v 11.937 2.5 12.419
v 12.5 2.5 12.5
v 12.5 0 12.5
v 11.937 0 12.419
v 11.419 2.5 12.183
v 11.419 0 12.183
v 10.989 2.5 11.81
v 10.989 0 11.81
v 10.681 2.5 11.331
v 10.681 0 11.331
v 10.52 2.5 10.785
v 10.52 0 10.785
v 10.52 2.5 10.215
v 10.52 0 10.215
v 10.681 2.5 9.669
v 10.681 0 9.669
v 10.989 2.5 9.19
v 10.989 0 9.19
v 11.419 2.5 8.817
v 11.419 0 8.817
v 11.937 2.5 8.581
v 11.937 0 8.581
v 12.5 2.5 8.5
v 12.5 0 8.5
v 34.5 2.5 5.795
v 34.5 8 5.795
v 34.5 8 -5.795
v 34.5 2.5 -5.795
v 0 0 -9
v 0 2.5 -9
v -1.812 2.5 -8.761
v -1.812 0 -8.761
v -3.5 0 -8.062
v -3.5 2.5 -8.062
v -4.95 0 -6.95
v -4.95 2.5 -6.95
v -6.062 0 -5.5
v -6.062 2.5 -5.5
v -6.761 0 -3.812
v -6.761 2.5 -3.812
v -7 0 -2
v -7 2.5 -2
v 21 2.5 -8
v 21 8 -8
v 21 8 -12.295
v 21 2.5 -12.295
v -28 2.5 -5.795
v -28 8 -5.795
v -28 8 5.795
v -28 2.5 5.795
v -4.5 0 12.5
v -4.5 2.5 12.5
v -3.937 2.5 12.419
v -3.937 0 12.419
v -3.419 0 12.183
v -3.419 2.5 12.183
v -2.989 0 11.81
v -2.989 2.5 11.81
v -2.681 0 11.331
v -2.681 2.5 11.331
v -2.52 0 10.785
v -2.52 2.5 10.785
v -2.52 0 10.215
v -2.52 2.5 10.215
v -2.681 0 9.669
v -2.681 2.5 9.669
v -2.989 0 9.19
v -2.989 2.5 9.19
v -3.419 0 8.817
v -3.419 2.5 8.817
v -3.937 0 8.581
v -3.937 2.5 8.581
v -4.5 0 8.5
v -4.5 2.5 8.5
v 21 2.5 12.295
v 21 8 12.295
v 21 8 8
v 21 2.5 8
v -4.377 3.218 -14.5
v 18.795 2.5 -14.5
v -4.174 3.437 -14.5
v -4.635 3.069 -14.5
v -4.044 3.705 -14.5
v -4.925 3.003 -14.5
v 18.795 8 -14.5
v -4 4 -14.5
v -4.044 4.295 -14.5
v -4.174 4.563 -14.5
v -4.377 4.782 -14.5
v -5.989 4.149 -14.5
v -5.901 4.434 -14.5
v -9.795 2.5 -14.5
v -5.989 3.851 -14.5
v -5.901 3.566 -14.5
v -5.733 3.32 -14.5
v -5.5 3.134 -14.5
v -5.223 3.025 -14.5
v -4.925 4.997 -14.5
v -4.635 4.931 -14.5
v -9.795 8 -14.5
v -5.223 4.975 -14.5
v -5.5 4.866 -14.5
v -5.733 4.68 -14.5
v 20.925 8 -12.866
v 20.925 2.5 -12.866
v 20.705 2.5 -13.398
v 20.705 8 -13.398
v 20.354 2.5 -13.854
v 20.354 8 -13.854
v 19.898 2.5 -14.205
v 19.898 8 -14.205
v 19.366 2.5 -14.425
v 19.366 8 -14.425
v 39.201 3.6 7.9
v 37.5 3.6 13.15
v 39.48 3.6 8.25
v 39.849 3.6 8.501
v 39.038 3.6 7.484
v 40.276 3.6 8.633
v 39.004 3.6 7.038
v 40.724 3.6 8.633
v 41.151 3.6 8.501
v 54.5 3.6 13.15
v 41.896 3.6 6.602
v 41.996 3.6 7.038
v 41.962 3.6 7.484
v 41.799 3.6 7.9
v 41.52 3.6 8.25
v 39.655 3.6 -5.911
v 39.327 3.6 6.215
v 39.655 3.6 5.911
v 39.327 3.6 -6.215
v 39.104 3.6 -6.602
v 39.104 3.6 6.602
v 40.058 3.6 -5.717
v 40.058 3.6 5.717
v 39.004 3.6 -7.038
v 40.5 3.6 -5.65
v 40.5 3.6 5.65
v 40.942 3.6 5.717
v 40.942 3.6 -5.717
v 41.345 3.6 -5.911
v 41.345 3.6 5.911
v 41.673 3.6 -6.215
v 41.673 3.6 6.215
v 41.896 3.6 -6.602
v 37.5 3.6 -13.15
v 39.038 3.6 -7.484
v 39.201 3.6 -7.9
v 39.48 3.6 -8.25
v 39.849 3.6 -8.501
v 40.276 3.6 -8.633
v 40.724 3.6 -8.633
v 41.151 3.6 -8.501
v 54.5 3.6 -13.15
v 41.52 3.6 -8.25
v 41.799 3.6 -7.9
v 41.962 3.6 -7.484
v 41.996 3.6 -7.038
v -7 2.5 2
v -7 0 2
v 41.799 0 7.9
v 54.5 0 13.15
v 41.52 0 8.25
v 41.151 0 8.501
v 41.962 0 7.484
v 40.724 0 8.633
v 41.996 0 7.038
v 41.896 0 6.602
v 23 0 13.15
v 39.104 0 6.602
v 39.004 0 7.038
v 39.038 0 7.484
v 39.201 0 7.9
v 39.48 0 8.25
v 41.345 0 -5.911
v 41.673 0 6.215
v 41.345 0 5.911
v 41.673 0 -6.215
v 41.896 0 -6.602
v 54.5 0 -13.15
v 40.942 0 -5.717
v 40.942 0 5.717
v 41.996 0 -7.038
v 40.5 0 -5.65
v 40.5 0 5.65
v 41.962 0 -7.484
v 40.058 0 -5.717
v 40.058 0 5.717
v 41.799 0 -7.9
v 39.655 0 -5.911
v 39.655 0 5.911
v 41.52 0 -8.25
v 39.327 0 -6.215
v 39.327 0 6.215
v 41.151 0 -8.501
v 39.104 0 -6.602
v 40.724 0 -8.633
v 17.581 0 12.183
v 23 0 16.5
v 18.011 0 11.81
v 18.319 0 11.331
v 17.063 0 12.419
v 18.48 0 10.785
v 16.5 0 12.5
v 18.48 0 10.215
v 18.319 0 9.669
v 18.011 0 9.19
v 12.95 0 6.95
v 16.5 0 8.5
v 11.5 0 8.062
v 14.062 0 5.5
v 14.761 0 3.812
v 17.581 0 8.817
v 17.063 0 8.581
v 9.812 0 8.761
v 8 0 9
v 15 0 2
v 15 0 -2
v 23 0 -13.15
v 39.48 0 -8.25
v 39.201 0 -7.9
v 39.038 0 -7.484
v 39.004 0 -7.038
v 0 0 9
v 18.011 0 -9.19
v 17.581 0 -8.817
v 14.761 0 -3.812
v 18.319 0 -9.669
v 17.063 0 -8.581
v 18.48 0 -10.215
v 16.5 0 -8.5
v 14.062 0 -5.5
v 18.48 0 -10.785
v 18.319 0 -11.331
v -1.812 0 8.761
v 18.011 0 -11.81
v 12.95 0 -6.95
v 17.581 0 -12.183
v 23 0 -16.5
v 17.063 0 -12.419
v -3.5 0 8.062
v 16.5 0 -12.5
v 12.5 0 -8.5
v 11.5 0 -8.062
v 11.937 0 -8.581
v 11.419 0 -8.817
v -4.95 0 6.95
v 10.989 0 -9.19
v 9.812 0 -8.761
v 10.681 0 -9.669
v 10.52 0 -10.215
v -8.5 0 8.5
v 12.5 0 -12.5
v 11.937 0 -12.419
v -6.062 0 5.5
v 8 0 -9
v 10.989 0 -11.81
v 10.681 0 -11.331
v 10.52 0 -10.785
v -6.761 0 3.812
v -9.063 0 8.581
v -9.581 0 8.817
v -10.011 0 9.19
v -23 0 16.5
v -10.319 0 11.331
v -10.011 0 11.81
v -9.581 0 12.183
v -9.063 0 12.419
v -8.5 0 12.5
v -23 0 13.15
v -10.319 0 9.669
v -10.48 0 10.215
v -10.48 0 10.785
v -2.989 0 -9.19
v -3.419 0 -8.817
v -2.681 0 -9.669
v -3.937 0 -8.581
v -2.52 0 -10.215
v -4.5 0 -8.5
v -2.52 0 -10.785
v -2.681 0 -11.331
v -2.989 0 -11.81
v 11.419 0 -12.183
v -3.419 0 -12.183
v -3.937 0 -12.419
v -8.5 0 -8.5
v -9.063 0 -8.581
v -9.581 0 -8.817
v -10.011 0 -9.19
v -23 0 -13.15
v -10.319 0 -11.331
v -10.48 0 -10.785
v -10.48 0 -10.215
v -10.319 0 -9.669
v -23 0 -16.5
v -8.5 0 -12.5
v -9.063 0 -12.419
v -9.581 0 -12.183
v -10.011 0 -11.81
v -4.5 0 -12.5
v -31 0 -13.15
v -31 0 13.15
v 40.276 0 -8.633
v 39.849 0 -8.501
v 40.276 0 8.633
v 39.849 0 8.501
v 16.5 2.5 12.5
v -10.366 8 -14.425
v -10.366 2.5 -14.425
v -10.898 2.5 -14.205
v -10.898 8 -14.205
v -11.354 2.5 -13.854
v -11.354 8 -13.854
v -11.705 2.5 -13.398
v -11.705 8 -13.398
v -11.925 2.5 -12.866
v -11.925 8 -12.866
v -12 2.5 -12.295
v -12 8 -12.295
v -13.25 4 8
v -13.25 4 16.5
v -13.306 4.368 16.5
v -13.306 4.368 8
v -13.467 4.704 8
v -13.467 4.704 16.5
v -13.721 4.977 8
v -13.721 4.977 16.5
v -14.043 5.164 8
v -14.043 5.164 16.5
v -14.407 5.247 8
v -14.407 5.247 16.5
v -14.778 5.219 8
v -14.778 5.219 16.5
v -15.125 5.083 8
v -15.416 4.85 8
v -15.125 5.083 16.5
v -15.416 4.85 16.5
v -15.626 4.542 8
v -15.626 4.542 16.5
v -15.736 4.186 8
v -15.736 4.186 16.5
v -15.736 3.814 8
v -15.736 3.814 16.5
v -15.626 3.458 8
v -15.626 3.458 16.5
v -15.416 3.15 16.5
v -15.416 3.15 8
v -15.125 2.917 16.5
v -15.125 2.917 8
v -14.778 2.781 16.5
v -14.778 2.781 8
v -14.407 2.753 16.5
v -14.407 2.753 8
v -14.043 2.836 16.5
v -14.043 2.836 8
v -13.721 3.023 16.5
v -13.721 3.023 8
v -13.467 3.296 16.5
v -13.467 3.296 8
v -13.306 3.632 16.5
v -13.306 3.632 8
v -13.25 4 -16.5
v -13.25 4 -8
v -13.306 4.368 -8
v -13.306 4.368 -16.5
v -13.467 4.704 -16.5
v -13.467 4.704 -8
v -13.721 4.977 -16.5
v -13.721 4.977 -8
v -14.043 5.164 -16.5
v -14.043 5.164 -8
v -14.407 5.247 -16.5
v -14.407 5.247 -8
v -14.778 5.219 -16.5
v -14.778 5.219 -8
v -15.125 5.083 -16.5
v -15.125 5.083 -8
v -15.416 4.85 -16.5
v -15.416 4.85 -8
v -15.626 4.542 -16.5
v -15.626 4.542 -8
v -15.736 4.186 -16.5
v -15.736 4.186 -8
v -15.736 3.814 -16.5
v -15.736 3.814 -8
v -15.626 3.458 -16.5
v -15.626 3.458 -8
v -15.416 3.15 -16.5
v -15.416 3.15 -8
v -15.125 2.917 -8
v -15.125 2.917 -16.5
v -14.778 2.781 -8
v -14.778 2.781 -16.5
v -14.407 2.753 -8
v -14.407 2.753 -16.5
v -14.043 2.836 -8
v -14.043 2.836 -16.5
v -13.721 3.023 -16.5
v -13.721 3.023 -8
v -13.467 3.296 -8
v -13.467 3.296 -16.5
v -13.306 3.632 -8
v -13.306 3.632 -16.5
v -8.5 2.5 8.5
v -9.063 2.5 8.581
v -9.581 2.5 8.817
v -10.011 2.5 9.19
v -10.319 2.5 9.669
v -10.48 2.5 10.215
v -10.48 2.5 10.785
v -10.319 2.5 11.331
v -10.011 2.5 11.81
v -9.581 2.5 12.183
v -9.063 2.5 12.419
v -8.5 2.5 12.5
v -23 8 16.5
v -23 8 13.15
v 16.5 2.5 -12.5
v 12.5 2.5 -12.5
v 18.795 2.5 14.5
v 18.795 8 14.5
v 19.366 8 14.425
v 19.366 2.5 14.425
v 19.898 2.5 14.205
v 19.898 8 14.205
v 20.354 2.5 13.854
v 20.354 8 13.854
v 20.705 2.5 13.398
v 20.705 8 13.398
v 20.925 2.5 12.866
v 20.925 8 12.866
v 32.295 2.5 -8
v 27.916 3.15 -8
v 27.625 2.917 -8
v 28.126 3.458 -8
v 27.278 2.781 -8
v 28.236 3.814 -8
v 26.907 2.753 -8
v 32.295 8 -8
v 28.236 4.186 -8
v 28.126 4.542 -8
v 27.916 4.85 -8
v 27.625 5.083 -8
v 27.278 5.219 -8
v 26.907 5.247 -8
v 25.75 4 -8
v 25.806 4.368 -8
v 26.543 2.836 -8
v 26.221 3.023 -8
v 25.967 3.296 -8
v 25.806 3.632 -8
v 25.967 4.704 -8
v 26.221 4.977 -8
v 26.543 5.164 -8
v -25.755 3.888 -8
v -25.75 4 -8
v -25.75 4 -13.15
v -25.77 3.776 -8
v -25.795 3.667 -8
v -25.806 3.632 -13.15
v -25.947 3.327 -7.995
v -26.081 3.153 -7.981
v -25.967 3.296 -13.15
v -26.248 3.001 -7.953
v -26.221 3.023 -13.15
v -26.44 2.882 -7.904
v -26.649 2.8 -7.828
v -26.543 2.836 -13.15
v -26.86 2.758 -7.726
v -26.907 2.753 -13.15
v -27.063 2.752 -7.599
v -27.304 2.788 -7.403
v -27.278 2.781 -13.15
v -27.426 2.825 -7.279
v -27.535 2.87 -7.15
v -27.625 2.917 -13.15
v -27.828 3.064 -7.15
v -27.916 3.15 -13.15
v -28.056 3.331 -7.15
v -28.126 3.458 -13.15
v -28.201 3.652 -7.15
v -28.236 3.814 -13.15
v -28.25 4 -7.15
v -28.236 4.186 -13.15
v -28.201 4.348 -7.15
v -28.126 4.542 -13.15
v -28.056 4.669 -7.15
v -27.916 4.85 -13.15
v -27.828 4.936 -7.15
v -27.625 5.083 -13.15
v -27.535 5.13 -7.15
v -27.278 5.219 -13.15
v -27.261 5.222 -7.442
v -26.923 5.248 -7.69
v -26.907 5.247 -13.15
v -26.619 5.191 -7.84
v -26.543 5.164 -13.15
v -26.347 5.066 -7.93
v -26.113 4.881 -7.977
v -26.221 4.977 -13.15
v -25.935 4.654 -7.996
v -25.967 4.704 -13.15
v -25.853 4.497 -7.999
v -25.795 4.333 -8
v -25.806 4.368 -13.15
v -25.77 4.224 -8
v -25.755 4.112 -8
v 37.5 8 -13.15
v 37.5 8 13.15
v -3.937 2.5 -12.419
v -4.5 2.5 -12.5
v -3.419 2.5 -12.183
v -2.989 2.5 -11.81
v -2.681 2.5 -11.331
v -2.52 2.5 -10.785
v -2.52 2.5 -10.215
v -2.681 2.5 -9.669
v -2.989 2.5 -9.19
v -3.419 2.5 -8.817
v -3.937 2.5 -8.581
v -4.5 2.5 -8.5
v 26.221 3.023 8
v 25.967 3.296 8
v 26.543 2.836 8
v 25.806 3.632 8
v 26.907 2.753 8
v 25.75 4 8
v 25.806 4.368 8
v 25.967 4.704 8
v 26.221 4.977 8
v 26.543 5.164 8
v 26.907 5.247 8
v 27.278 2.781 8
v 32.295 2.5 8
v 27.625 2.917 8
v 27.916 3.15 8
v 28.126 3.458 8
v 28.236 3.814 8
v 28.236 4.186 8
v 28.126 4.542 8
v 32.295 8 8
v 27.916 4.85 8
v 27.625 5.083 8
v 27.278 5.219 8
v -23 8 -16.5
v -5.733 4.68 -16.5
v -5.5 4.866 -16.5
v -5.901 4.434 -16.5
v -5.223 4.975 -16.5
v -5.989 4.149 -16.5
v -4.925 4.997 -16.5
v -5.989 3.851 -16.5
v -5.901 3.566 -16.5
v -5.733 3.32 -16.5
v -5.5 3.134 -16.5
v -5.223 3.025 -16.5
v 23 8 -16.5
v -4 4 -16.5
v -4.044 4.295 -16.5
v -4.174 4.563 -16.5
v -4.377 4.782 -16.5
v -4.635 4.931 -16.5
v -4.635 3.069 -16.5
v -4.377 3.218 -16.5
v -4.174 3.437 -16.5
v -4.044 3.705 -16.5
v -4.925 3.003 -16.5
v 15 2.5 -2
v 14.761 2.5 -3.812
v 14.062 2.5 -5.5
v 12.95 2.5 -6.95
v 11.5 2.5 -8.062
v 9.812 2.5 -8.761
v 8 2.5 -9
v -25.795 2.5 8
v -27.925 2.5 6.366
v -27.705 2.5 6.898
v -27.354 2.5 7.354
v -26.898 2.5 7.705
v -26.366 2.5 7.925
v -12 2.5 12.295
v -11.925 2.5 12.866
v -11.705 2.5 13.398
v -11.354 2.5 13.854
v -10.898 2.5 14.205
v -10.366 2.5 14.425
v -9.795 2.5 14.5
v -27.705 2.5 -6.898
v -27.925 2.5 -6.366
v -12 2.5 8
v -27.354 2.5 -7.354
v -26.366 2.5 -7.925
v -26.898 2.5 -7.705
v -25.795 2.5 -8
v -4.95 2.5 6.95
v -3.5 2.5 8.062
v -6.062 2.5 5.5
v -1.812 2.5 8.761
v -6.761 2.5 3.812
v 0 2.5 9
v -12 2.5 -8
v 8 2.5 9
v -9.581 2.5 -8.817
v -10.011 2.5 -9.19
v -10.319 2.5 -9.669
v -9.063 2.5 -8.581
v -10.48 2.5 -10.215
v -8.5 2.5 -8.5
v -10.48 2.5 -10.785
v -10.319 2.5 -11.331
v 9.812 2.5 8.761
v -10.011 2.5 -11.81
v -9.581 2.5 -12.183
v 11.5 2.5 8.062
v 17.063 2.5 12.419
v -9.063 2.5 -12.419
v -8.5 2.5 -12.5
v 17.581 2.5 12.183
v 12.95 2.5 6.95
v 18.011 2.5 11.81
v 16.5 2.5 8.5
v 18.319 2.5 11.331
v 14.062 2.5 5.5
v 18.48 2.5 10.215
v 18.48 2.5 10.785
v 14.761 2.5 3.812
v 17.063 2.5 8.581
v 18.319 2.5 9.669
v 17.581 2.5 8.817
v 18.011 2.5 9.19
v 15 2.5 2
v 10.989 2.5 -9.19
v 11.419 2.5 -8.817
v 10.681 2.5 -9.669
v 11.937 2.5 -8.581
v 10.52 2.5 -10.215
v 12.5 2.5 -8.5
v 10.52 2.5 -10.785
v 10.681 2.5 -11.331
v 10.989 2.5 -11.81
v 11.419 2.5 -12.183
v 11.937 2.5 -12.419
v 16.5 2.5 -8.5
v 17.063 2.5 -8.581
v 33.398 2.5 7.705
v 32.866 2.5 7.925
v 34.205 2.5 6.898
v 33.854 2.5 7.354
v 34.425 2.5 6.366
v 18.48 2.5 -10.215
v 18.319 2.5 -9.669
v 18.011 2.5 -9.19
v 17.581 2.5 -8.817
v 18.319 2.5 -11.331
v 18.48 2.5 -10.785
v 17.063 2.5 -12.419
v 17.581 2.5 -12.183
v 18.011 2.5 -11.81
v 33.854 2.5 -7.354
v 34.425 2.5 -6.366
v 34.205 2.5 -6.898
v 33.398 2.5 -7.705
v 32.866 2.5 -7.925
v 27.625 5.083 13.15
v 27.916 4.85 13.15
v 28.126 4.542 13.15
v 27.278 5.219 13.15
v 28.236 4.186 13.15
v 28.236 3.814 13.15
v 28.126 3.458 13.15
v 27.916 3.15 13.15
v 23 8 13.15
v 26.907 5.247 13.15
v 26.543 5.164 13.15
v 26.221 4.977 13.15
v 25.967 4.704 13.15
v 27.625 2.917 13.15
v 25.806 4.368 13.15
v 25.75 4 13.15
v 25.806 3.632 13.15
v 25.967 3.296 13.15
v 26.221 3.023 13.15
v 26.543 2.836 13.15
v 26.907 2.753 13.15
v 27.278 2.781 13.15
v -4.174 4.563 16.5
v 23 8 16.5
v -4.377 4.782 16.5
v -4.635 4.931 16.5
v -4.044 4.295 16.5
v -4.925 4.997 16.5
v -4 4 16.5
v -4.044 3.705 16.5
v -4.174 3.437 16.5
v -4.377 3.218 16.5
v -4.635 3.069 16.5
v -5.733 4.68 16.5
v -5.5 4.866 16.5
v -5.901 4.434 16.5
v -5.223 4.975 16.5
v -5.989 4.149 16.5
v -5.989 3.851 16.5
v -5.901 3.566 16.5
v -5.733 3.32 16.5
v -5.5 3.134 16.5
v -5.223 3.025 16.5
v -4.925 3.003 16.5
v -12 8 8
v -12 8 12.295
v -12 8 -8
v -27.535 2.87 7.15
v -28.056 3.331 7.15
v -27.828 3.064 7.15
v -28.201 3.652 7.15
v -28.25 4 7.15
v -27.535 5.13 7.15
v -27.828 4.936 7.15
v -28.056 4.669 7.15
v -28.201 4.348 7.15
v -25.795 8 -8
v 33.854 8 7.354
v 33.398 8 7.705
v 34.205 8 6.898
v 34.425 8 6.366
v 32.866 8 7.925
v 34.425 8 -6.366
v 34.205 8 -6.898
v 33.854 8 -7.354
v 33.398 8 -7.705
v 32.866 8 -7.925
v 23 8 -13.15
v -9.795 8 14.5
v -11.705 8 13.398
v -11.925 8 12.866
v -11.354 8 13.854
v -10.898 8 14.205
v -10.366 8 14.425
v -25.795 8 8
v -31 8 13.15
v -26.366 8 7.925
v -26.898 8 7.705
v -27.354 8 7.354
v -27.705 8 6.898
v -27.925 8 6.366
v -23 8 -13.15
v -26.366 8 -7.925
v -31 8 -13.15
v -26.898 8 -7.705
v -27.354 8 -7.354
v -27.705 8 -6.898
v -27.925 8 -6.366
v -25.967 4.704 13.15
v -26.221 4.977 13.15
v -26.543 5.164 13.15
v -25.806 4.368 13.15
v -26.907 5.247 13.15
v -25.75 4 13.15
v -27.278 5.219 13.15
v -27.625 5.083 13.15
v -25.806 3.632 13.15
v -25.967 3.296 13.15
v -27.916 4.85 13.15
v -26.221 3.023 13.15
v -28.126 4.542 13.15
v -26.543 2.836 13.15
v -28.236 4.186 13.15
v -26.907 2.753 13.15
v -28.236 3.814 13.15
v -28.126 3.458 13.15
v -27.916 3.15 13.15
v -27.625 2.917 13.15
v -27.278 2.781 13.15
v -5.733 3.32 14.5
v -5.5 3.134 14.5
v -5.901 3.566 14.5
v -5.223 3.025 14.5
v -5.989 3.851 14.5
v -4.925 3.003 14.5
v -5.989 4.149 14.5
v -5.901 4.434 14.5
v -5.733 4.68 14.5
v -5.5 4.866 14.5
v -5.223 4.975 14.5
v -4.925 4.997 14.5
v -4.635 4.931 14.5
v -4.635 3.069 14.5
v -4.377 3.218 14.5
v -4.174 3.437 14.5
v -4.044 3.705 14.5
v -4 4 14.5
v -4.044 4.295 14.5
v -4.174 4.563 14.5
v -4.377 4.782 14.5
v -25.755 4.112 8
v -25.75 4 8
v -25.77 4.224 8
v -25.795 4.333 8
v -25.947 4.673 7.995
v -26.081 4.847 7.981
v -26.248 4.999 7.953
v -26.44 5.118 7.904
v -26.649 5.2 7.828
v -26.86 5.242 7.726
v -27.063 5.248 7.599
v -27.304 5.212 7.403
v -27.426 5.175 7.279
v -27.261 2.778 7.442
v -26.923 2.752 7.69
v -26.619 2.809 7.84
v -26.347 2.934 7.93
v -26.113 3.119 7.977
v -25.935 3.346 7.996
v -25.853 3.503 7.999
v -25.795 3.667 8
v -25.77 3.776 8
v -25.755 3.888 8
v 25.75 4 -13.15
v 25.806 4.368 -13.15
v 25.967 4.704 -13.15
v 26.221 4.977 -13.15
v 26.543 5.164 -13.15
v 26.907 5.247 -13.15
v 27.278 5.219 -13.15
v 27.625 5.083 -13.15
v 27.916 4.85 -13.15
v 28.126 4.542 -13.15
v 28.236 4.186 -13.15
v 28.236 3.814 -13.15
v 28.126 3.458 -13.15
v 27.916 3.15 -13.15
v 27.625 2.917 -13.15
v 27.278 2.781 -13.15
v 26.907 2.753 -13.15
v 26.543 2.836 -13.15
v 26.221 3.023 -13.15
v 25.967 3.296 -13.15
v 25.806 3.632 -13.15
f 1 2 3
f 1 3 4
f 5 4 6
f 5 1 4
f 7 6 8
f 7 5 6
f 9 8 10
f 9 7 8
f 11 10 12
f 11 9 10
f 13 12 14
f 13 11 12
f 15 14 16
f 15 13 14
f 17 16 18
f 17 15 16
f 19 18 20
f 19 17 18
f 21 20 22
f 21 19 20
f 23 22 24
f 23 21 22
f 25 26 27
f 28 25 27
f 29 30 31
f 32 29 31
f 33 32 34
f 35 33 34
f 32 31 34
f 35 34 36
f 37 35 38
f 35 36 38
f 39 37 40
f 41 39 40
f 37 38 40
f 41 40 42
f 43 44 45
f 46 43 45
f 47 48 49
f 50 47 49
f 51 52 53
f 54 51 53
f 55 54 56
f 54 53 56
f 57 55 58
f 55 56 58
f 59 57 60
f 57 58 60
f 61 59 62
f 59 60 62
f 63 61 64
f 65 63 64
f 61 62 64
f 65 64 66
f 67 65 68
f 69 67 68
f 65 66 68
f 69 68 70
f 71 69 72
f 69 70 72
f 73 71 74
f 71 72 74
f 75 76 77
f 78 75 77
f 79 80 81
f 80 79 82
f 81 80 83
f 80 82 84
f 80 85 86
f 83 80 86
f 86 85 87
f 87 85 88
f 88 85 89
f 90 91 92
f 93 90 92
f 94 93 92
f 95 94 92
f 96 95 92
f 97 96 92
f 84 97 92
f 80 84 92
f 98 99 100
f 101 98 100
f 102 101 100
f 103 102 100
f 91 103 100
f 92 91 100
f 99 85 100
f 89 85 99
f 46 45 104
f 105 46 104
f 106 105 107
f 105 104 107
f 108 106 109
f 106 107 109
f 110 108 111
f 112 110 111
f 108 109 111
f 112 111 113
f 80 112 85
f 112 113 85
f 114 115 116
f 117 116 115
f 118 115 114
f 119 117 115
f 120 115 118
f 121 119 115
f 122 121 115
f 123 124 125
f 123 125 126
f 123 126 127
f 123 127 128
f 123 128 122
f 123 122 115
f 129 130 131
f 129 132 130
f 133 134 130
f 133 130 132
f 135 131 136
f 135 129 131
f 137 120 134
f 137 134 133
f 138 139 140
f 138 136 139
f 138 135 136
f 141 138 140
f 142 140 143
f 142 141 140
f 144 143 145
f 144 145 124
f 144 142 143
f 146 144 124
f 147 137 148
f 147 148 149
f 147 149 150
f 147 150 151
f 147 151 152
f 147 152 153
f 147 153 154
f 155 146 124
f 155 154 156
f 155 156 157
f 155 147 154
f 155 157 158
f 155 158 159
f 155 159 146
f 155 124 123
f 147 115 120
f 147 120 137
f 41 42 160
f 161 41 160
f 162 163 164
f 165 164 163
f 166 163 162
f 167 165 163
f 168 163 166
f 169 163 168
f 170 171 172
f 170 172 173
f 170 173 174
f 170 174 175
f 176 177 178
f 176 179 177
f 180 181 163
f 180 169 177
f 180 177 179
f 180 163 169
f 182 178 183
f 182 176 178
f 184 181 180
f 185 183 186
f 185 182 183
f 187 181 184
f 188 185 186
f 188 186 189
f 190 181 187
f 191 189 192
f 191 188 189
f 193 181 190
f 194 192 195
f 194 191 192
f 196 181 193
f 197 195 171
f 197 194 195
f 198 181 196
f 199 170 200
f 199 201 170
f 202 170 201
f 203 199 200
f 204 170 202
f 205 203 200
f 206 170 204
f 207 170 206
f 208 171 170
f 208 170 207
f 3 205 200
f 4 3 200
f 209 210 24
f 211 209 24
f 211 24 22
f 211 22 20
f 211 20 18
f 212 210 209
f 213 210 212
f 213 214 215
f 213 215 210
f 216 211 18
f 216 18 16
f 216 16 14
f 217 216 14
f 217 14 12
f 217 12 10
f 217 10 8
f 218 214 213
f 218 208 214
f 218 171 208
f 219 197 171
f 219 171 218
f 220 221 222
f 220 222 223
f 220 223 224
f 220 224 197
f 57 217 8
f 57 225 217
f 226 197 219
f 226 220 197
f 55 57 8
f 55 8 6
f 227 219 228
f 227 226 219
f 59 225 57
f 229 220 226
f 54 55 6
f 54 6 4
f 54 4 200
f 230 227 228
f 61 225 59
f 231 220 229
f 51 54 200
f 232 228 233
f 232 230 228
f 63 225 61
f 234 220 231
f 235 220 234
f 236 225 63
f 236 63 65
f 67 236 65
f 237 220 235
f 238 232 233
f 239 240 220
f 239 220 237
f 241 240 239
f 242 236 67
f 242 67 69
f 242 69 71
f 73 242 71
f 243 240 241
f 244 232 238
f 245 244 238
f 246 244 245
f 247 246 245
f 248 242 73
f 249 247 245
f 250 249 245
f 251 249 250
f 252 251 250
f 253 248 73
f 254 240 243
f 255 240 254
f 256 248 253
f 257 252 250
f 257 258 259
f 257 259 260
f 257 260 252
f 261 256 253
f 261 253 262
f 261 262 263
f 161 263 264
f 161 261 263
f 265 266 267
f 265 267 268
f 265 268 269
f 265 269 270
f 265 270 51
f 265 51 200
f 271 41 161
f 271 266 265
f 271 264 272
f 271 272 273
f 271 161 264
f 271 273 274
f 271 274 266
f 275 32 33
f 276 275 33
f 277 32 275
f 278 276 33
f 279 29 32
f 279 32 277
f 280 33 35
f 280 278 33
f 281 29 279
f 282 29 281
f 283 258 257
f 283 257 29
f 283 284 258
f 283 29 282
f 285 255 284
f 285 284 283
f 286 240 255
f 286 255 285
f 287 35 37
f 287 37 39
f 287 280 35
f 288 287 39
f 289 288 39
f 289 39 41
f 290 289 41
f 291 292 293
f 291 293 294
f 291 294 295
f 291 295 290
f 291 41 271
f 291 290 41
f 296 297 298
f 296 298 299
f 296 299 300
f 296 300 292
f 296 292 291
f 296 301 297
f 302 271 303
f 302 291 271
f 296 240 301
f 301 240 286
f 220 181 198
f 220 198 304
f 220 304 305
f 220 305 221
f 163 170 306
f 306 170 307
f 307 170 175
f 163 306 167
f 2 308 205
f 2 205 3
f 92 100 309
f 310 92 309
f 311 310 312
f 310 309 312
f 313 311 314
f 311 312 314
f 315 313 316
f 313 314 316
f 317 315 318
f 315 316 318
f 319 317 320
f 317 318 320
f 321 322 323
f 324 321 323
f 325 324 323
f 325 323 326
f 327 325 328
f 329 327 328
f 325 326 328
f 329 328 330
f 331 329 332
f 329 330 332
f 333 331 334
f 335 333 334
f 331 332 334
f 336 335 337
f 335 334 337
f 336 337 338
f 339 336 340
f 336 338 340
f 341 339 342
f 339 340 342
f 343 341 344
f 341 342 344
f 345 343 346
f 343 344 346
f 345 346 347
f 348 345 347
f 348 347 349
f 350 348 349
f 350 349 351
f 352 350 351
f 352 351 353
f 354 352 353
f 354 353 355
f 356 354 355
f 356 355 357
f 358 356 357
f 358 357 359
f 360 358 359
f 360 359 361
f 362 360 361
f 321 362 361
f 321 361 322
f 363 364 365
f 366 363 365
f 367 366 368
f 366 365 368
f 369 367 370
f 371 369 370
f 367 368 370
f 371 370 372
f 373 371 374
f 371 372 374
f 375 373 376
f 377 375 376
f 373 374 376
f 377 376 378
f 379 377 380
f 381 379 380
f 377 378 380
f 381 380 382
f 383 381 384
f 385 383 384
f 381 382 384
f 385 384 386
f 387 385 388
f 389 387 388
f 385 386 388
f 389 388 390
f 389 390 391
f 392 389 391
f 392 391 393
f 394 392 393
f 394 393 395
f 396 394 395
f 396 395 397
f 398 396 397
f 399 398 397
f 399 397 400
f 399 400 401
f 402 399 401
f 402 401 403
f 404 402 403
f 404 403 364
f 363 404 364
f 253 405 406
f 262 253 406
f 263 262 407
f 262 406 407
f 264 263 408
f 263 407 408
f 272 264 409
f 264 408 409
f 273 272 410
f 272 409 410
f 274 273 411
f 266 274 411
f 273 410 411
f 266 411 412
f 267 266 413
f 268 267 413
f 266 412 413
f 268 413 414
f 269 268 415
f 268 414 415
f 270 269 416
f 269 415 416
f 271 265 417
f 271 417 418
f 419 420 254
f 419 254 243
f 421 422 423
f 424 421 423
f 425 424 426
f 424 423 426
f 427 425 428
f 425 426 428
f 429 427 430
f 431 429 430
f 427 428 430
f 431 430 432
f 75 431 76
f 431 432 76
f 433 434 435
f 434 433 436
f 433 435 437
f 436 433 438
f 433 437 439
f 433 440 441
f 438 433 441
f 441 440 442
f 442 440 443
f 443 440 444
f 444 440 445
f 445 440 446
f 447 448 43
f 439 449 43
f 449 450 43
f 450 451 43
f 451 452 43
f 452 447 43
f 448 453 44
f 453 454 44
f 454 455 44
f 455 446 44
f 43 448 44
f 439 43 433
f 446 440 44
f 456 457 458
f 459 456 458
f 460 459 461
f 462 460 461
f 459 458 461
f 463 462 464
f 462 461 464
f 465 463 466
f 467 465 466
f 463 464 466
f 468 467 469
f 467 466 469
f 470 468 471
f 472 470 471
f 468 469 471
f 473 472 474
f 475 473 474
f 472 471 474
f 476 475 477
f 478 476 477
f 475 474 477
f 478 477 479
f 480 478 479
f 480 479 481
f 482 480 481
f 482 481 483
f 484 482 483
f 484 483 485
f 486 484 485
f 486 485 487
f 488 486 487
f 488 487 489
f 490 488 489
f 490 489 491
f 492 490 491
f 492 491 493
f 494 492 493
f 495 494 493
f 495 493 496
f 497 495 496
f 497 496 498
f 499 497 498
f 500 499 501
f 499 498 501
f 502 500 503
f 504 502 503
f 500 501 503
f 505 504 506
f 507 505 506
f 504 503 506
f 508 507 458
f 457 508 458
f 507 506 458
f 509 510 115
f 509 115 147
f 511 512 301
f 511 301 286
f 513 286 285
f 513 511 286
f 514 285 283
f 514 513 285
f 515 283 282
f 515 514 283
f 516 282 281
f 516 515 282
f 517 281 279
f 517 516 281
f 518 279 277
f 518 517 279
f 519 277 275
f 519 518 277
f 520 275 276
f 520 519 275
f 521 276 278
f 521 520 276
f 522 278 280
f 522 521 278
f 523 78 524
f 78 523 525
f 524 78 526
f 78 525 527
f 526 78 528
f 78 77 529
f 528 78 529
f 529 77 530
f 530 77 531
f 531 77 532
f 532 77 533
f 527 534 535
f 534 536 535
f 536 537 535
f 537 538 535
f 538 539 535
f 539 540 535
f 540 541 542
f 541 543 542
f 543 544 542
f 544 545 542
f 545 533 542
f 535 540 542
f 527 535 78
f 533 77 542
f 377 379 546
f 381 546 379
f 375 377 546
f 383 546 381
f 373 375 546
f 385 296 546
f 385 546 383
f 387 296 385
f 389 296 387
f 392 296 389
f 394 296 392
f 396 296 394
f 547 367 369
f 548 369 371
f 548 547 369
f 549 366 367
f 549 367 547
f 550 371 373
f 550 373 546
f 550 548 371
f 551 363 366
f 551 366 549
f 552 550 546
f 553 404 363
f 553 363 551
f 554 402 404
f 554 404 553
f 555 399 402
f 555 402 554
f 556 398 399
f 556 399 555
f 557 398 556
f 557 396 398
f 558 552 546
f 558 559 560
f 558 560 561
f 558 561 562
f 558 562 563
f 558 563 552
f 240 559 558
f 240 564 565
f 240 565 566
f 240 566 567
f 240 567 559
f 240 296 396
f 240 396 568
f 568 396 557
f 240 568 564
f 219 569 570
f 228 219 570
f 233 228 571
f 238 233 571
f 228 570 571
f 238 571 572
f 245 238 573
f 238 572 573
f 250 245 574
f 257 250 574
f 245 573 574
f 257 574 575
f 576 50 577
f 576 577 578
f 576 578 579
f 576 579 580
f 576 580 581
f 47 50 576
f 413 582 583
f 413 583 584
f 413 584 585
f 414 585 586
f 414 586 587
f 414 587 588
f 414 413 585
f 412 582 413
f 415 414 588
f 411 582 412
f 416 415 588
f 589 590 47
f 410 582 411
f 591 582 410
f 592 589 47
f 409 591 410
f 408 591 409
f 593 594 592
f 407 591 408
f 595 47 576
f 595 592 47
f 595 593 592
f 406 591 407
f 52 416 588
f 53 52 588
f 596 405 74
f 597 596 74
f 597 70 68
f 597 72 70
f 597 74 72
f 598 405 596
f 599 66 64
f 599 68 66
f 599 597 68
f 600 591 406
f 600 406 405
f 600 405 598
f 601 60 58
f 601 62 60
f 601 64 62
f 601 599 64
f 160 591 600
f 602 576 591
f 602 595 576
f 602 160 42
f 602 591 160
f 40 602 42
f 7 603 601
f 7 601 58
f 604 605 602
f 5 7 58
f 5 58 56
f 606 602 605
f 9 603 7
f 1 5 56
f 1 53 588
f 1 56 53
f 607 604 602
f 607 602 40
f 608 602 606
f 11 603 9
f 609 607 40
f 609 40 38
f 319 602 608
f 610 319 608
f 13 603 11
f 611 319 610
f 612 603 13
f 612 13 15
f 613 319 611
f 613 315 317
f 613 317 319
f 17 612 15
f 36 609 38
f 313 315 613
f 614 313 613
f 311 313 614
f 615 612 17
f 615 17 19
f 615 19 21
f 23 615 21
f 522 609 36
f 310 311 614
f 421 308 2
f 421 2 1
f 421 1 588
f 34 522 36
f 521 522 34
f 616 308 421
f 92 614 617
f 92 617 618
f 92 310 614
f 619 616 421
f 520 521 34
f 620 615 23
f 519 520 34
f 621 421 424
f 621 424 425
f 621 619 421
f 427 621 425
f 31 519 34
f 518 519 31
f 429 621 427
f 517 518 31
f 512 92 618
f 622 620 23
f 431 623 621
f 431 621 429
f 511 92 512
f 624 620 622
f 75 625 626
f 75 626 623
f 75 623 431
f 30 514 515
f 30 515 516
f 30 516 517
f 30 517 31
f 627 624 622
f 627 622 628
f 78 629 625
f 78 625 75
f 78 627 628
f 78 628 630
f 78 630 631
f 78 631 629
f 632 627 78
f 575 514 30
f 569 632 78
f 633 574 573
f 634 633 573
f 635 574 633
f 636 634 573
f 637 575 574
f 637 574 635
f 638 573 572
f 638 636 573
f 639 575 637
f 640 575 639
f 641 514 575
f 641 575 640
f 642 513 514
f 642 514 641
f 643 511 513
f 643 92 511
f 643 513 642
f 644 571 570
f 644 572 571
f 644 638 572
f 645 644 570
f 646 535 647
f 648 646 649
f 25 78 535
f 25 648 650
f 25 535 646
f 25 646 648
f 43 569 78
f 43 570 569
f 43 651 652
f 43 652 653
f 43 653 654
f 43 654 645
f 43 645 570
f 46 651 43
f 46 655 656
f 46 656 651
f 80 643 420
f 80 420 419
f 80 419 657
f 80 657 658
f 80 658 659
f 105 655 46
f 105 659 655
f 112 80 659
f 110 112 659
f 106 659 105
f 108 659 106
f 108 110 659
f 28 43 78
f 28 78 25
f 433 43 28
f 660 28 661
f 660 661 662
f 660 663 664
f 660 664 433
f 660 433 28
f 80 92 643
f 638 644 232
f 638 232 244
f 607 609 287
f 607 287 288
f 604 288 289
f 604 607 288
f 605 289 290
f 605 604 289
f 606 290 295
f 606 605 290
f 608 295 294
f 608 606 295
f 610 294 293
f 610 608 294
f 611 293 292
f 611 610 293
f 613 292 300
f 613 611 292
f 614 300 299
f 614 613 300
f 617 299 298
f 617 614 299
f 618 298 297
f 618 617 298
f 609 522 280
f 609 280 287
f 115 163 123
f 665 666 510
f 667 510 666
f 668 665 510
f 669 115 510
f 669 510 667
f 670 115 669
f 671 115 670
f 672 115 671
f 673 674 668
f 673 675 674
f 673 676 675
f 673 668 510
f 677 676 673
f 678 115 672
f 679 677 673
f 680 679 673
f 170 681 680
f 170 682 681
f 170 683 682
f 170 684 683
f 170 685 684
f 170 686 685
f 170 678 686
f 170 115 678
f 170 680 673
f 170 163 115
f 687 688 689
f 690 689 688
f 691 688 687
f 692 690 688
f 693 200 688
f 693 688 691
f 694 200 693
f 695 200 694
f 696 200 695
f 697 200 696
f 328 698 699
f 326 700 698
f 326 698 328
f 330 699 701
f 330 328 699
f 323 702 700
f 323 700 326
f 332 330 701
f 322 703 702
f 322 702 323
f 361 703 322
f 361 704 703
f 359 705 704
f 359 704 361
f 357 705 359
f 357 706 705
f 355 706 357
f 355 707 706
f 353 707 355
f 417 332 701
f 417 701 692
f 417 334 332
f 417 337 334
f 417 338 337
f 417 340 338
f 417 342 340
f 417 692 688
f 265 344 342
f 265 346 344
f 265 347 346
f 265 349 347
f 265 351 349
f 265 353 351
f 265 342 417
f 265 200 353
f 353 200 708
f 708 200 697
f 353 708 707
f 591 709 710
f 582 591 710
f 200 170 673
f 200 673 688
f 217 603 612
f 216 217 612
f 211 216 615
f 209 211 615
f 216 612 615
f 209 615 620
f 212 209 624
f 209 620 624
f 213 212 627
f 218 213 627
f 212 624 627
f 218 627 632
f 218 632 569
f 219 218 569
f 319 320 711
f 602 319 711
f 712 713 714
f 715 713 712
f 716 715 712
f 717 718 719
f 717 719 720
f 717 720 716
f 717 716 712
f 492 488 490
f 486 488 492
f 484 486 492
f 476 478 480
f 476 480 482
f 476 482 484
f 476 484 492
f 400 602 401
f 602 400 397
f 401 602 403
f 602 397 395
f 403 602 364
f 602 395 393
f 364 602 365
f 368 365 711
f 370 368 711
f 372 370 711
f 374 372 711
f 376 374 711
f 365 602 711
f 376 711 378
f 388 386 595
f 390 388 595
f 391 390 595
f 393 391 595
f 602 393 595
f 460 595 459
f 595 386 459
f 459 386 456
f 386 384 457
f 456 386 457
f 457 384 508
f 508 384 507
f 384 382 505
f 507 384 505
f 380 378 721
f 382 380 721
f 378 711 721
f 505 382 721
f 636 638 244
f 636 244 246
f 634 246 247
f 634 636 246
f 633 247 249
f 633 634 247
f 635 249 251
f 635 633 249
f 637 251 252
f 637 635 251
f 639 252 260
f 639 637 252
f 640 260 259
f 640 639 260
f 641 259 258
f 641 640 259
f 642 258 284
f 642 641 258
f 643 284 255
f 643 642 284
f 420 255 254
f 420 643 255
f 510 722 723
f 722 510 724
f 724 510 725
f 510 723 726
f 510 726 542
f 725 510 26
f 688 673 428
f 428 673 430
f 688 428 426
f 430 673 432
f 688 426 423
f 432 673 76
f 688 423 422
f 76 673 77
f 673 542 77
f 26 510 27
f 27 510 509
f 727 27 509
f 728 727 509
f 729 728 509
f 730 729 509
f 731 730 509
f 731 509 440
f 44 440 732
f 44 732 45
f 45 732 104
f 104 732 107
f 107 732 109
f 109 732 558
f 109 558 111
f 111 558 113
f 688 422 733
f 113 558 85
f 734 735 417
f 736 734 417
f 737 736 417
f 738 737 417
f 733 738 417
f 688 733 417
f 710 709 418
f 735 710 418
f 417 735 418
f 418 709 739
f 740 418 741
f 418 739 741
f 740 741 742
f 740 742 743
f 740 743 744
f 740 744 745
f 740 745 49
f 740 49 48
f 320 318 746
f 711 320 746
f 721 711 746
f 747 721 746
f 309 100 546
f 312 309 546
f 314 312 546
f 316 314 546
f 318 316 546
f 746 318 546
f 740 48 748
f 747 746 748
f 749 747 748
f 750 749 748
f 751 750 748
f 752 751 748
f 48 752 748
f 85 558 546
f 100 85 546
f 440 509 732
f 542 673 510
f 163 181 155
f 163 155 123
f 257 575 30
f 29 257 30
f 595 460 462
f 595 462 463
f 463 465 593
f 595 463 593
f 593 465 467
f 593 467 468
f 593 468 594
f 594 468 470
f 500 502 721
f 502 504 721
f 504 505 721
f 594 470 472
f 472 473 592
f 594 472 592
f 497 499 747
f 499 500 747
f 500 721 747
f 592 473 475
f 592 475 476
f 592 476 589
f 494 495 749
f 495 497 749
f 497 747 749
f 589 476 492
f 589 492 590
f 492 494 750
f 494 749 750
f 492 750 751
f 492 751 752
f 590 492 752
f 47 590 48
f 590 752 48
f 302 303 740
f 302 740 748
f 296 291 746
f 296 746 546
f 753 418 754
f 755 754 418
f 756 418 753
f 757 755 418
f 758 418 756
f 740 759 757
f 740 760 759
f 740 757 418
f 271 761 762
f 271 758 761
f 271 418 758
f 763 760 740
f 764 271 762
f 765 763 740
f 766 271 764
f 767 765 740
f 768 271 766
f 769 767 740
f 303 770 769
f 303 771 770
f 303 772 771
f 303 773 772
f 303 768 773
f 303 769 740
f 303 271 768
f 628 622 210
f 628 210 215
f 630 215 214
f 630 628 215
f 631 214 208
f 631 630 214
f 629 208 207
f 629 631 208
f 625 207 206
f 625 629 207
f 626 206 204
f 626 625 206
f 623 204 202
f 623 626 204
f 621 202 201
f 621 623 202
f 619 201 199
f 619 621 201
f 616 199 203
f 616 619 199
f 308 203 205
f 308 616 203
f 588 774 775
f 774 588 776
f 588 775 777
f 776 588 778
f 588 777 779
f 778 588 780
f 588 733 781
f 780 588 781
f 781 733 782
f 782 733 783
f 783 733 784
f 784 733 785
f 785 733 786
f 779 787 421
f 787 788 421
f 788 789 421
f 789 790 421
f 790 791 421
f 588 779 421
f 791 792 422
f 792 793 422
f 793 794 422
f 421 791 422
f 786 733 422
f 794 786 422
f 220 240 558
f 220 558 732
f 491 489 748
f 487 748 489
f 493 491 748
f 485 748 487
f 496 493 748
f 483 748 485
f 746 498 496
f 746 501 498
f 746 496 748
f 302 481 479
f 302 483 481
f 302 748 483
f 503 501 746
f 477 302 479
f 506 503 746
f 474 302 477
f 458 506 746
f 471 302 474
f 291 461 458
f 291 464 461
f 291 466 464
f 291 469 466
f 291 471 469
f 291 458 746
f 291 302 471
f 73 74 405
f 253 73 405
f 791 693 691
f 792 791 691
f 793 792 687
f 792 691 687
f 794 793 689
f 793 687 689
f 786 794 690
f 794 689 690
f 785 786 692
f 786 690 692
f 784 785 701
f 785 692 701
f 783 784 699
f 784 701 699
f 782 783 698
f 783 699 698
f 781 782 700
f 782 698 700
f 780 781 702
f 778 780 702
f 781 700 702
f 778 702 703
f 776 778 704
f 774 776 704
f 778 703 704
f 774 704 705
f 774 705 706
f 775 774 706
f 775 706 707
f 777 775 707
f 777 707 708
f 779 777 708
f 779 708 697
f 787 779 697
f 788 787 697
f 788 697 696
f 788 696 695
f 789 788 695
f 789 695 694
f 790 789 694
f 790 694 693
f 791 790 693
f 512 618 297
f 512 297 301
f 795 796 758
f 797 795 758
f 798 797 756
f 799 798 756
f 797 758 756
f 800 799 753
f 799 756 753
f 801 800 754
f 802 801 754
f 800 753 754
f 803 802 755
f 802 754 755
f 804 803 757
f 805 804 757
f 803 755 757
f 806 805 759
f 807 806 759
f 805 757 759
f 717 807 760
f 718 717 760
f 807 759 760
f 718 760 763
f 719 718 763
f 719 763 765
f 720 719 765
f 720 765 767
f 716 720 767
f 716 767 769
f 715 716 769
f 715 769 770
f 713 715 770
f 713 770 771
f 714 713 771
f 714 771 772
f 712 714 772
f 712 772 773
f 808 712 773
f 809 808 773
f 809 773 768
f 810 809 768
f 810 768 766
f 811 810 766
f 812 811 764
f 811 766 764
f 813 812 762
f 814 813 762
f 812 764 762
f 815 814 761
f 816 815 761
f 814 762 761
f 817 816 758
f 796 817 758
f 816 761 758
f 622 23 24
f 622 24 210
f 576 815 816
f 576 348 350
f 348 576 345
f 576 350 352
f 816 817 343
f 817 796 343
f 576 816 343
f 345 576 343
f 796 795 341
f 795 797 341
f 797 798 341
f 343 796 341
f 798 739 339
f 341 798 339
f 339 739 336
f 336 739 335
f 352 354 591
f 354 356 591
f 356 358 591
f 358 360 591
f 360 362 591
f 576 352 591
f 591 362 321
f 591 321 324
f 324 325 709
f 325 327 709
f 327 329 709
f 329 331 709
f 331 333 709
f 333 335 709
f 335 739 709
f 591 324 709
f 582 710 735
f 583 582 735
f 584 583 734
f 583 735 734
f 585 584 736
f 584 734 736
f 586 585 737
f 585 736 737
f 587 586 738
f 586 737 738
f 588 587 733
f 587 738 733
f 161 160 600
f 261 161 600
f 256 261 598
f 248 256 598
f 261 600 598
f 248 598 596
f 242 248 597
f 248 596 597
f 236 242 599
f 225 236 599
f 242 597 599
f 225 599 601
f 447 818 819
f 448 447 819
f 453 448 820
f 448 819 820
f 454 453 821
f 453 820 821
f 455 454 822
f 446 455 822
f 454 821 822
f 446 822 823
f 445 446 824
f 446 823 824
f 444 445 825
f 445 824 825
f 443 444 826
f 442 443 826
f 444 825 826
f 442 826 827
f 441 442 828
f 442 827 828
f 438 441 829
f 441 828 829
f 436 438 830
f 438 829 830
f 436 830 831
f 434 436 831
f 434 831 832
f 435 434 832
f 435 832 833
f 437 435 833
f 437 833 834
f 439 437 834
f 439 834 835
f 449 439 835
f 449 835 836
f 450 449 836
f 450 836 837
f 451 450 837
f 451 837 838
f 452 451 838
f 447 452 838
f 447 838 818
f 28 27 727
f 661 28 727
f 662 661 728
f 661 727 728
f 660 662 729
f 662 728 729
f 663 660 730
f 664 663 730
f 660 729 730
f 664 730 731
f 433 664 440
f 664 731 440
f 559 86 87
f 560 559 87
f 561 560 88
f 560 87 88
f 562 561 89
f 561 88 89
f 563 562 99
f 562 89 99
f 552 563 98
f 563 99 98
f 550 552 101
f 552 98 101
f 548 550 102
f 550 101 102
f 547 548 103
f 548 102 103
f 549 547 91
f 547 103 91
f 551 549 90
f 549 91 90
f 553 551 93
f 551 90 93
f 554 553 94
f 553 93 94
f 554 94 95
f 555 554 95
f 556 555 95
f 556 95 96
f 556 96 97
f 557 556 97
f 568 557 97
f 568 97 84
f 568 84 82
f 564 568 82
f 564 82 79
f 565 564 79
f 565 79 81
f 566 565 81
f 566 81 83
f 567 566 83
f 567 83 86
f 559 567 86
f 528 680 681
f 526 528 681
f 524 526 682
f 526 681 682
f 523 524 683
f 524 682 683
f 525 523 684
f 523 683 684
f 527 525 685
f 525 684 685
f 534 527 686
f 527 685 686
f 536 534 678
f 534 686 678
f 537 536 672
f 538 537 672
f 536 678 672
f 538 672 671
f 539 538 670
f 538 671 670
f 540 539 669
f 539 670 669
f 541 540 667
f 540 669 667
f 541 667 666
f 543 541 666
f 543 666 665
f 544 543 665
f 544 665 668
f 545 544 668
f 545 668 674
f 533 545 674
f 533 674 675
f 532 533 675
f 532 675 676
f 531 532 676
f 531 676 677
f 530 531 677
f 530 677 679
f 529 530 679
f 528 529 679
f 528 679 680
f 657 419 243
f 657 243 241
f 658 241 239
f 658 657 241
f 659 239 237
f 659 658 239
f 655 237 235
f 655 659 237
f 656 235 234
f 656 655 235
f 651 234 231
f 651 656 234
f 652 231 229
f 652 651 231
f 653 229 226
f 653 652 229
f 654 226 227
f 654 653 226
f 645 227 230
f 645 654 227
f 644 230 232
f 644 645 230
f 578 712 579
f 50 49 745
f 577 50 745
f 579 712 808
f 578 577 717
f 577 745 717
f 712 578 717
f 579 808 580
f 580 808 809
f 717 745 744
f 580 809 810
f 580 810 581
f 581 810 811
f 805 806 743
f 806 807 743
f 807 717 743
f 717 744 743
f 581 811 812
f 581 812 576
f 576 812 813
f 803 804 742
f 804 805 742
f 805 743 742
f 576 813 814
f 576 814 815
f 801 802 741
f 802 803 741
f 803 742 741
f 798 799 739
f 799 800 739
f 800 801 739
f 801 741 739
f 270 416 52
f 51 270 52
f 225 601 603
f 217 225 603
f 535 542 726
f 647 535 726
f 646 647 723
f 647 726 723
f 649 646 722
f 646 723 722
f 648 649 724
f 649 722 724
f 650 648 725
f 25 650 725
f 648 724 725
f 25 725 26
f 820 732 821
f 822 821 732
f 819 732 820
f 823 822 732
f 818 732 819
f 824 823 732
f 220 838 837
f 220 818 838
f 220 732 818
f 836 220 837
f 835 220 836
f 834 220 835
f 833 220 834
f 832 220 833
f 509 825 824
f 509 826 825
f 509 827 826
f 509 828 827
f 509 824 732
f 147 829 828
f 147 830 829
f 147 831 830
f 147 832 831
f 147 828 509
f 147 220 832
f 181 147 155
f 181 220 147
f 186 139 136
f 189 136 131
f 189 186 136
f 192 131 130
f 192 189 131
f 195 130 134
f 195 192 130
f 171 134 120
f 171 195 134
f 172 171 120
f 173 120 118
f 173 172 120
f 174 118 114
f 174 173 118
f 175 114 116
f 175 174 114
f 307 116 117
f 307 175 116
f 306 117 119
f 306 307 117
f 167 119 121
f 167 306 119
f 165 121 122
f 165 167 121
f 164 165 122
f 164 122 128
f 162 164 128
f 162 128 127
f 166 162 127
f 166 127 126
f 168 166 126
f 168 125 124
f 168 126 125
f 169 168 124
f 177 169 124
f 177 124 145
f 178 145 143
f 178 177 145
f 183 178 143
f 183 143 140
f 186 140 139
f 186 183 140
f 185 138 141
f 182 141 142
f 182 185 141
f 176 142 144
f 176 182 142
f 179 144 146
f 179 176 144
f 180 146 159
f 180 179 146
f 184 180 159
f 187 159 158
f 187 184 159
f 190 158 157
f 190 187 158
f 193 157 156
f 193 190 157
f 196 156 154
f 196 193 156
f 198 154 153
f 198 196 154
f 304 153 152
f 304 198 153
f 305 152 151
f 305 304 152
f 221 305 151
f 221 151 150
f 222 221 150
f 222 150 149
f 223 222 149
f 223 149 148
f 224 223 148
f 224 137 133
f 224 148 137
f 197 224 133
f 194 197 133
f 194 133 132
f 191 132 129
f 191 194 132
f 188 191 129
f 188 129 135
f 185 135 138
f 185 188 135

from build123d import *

# Parameters (mm, degrees)
SKETCH_1_R           = 1.5
EXTRUDE_1_DEPTH      = 8
SKETCH_2_W           = 17
SKETCH_2_H           = 26.3
CUT_EXTRUDE_1_DEPTH  = 4.4
CUT_EXTRUDE_3_DEPTH  = 5.5
CUT_EXTRUDE_4_DEPTH  = 3.5
CUT_EXTRUDE_5_DEPTH  = 3.5
SKETCH_9_R           = 1.25
CUT_EXTRUDE_6_DEPTH  = 6
SKETCH_10_R          = 1.25
CUT_EXTRUDE_7_DEPTH  = 6
SKETCH_11_R          = 1.25
CUT_EXTRUDE_8_DEPTH  = 6
SKETCH_12_R          = 1.25
CUT_EXTRUDE_9_DEPTH  = 6
SKETCH_13_R          = 1
SKETCH_13_R_2        = 1.25
CUT_EXTRUDE_10_DEPTH = 46


with BuildPart() as part:
    # Эскиз1 → Бобышка-Вытянуть1 (new body)
    with BuildSketch(Plane(origin=(0, 0, 0), x_dir=(1, 0, 0), z_dir=(0, 1, 0))):
        Polygon((-23, 16.5), (23, 16.5), (23, 13.15), (54.5, 13.15), (54.5, -13.15), (23, -13.15), (23, -16.5), (-23, -16.5), (-23, -13.15), (-31, -13.15), (-31, 13.15), (-23, 13.15), align=None)
        with Locations(Location((40.5, 7.15, 0), (0, 0, 270))):  # turned: the seam where the file's is
            Circle(SKETCH_1_R, mode=Mode.SUBTRACT)
        with Locations(Location((40.5, -7.15, 0), (0, 0, 90))):  # turned: the seam where the file's is
            Circle(SKETCH_1_R, mode=Mode.SUBTRACT)
    extrude(amount=EXTRUDE_1_DEPTH)

    # Эскиз2 → Вырез-Вытянуть1 (cut)
    with BuildSketch(Plane(origin=(0, 8, 0), x_dir=(1, 0, 0), z_dir=(0, 1, 0))):
        with Locations((46, 0)):
            Rectangle(SKETCH_2_W, SKETCH_2_H)
    extrude(amount=-CUT_EXTRUDE_1_DEPTH, mode=Mode.SUBTRACT)

    # Эскиз3 → Вырез-Вытянуть3 (cut)
    with BuildSketch(Plane(origin=(0, 8, 0), x_dir=(1, 0, 0), z_dir=(0, 1, 0))):
        with BuildLine():
            Line((-25.795194039, -8), (-12, -8))
            Line((-12, -8), (-12, -12.295194039))
            ThreePointArc((-12, -12.295194039), (-11.354227285, -13.854227285), (-9.795194039, -14.5))
            Line((-9.795194039, -14.5), (18.795194039, -14.5))
            ThreePointArc((18.795194039, -14.5), (20.354227285, -13.854227285), (21, -12.295194039))
            Line((21, -12.295194039), (21, -8))
            Line((21, -8), (32.295194039, -8))
            ThreePointArc((32.295194039, -8), (33.854227285, -7.354227285), (34.5, -5.795194039))
            Line((34.5, -5.795194039), (34.5, 5.795194039))
            ThreePointArc((34.5, 5.795194039), (33.854227285, 7.354227285), (32.295194039, 8))
            Line((32.295194039, 8), (21, 8))
            Line((21, 8), (21, 12.295194039))
            ThreePointArc((21, 12.295194039), (20.354227285, 13.854227285), (18.795194039, 14.5))
            Line((18.795194039, 14.5), (-9.795194039, 14.5))
            ThreePointArc((-9.795194039, 14.5), (-11.354227285, 13.854227285), (-12, 12.295194039))
            Line((-12, 12.295194039), (-12, 8))
            Line((-12, 8), (-25.795194039, 8))
            ThreePointArc((-25.795194039, 8), (-27.354227285, 7.354227285), (-28, 5.795194039))
            Line((-28, 5.795194039), (-28, -5.795194039))
            ThreePointArc((-28, -5.795194039), (-27.354227285, -7.354227285), (-25.795194039, -8))
        make_face()
    extrude(amount=-CUT_EXTRUDE_3_DEPTH, mode=Mode.SUBTRACT)

    # Эскиз6 → Вырез-Вытянуть4 (cut, through all)
    with BuildSketch(Plane(origin=(0, 2.5, 0), x_dir=(1, 0, 0), z_dir=(0, 1, 0))):
        with BuildLine():
            Line((-7, 2), (-7, -2))
            ThreePointArc((-7, -2), (-4.949747468, -6.949747468), (0, -9))
            Line((0, -9), (8, -9))
            ThreePointArc((8, -9), (12.949747468, -6.949747468), (15, -2))
            Line((15, -2), (15, 2))
            ThreePointArc((15, 2), (12.949747468, 6.949747468), (8, 9))
            Line((8, 9), (0, 9))
            ThreePointArc((0, 9), (-4.949747468, 6.949747468), (-7, 2))
        make_face()
    extrude(amount=-CUT_EXTRUDE_4_DEPTH, mode=Mode.SUBTRACT)

    # Эскиз7 → Вырез-Вытянуть5 (cut, through all)
    with BuildSketch(Plane(origin=(0, 2.5, 0), x_dir=(1, 0, 0), z_dir=(0, 1, 0))):
        with BuildLine():
            Line((12.5, 12.5), (16.5, 12.5))
            ThreePointArc((16.5, 12.5), (18.5, 10.5), (16.5, 8.5))
            Line((16.5, 8.5), (12.5, 8.5))
            ThreePointArc((12.5, 8.5), (10.5, 10.5), (12.5, 12.5))
        make_face()
        with BuildLine():
            Line((-4.5, 8.5), (-8.5, 8.5))
            ThreePointArc((-8.5, 8.5), (-10.5, 10.5), (-8.5, 12.5))
            Line((-8.5, 12.5), (-4.5, 12.5))
            ThreePointArc((-4.5, 12.5), (-2.5, 10.5), (-4.5, 8.5))
        make_face()
        with BuildLine():
            Line((12.5, -8.5), (16.5, -8.5))
            ThreePointArc((16.5, -8.5), (18.5, -10.5), (16.5, -12.5))
            Line((16.5, -12.5), (12.5, -12.5))
            ThreePointArc((12.5, -12.5), (10.5, -10.5), (12.5, -8.5))
        make_face()
        with BuildLine():
            Line((-4.5, -8.5), (-8.5, -8.5))
            ThreePointArc((-8.5, -8.5), (-10.5, -10.5), (-8.5, -12.5))
            Line((-8.5, -12.5), (-4.5, -12.5))
            ThreePointArc((-4.5, -12.5), (-2.5, -10.5), (-4.5, -8.5))
        make_face()
    extrude(amount=-CUT_EXTRUDE_5_DEPTH, mode=Mode.SUBTRACT)

    # Эскиз9 → Вырез-Вытянуть6 (cut)
    with BuildSketch(Plane.XY.offset(13.15)):
        with Locations((-27, 4)):
            Circle(SKETCH_9_R)
    extrude(amount=-CUT_EXTRUDE_6_DEPTH, mode=Mode.SUBTRACT)

    # Эскиз10 → Вырез-Вытянуть7 (cut)
    with BuildSketch(Plane(origin=(0, 0, -13.15), x_dir=(-1, 0, 0), z_dir=(0, 0, -1))):
        with Locations(Location((27, 4, 0), (0, 0, 180))):  # turned: the seam where the file's is
            Circle(SKETCH_10_R)
    extrude(amount=-CUT_EXTRUDE_7_DEPTH, mode=Mode.SUBTRACT)

    # Эскиз11 → Вырез-Вытянуть8 (cut)
    with BuildSketch(Plane(origin=(0, 0, -13.15), x_dir=(-1, 0, 0), z_dir=(0, 0, -1))):
        with Locations((-27, 4)):
            Circle(SKETCH_11_R)
    extrude(amount=-CUT_EXTRUDE_8_DEPTH, mode=Mode.SUBTRACT)

    # Эскиз12 → Вырез-Вытянуть9 (cut)
    with BuildSketch(Plane.XY.offset(13.15)):
        with Locations(Location((27, 4, 0), (0, 0, 180))):  # turned: the seam where the file's is
            Circle(SKETCH_12_R)
    extrude(amount=-CUT_EXTRUDE_9_DEPTH, mode=Mode.SUBTRACT)

    # Эскиз13 → Вырез-Вытянуть10 (cut)
    with BuildSketch(Plane.XY.offset(16.5)):
        with Locations((-5, 4)):
            Circle(SKETCH_13_R)
        with Locations((-14.5, 4)):
            Circle(SKETCH_13_R_2)
    extrude(amount=-CUT_EXTRUDE_10_DEPTH, mode=Mode.SUBTRACT)


solid = part.part
